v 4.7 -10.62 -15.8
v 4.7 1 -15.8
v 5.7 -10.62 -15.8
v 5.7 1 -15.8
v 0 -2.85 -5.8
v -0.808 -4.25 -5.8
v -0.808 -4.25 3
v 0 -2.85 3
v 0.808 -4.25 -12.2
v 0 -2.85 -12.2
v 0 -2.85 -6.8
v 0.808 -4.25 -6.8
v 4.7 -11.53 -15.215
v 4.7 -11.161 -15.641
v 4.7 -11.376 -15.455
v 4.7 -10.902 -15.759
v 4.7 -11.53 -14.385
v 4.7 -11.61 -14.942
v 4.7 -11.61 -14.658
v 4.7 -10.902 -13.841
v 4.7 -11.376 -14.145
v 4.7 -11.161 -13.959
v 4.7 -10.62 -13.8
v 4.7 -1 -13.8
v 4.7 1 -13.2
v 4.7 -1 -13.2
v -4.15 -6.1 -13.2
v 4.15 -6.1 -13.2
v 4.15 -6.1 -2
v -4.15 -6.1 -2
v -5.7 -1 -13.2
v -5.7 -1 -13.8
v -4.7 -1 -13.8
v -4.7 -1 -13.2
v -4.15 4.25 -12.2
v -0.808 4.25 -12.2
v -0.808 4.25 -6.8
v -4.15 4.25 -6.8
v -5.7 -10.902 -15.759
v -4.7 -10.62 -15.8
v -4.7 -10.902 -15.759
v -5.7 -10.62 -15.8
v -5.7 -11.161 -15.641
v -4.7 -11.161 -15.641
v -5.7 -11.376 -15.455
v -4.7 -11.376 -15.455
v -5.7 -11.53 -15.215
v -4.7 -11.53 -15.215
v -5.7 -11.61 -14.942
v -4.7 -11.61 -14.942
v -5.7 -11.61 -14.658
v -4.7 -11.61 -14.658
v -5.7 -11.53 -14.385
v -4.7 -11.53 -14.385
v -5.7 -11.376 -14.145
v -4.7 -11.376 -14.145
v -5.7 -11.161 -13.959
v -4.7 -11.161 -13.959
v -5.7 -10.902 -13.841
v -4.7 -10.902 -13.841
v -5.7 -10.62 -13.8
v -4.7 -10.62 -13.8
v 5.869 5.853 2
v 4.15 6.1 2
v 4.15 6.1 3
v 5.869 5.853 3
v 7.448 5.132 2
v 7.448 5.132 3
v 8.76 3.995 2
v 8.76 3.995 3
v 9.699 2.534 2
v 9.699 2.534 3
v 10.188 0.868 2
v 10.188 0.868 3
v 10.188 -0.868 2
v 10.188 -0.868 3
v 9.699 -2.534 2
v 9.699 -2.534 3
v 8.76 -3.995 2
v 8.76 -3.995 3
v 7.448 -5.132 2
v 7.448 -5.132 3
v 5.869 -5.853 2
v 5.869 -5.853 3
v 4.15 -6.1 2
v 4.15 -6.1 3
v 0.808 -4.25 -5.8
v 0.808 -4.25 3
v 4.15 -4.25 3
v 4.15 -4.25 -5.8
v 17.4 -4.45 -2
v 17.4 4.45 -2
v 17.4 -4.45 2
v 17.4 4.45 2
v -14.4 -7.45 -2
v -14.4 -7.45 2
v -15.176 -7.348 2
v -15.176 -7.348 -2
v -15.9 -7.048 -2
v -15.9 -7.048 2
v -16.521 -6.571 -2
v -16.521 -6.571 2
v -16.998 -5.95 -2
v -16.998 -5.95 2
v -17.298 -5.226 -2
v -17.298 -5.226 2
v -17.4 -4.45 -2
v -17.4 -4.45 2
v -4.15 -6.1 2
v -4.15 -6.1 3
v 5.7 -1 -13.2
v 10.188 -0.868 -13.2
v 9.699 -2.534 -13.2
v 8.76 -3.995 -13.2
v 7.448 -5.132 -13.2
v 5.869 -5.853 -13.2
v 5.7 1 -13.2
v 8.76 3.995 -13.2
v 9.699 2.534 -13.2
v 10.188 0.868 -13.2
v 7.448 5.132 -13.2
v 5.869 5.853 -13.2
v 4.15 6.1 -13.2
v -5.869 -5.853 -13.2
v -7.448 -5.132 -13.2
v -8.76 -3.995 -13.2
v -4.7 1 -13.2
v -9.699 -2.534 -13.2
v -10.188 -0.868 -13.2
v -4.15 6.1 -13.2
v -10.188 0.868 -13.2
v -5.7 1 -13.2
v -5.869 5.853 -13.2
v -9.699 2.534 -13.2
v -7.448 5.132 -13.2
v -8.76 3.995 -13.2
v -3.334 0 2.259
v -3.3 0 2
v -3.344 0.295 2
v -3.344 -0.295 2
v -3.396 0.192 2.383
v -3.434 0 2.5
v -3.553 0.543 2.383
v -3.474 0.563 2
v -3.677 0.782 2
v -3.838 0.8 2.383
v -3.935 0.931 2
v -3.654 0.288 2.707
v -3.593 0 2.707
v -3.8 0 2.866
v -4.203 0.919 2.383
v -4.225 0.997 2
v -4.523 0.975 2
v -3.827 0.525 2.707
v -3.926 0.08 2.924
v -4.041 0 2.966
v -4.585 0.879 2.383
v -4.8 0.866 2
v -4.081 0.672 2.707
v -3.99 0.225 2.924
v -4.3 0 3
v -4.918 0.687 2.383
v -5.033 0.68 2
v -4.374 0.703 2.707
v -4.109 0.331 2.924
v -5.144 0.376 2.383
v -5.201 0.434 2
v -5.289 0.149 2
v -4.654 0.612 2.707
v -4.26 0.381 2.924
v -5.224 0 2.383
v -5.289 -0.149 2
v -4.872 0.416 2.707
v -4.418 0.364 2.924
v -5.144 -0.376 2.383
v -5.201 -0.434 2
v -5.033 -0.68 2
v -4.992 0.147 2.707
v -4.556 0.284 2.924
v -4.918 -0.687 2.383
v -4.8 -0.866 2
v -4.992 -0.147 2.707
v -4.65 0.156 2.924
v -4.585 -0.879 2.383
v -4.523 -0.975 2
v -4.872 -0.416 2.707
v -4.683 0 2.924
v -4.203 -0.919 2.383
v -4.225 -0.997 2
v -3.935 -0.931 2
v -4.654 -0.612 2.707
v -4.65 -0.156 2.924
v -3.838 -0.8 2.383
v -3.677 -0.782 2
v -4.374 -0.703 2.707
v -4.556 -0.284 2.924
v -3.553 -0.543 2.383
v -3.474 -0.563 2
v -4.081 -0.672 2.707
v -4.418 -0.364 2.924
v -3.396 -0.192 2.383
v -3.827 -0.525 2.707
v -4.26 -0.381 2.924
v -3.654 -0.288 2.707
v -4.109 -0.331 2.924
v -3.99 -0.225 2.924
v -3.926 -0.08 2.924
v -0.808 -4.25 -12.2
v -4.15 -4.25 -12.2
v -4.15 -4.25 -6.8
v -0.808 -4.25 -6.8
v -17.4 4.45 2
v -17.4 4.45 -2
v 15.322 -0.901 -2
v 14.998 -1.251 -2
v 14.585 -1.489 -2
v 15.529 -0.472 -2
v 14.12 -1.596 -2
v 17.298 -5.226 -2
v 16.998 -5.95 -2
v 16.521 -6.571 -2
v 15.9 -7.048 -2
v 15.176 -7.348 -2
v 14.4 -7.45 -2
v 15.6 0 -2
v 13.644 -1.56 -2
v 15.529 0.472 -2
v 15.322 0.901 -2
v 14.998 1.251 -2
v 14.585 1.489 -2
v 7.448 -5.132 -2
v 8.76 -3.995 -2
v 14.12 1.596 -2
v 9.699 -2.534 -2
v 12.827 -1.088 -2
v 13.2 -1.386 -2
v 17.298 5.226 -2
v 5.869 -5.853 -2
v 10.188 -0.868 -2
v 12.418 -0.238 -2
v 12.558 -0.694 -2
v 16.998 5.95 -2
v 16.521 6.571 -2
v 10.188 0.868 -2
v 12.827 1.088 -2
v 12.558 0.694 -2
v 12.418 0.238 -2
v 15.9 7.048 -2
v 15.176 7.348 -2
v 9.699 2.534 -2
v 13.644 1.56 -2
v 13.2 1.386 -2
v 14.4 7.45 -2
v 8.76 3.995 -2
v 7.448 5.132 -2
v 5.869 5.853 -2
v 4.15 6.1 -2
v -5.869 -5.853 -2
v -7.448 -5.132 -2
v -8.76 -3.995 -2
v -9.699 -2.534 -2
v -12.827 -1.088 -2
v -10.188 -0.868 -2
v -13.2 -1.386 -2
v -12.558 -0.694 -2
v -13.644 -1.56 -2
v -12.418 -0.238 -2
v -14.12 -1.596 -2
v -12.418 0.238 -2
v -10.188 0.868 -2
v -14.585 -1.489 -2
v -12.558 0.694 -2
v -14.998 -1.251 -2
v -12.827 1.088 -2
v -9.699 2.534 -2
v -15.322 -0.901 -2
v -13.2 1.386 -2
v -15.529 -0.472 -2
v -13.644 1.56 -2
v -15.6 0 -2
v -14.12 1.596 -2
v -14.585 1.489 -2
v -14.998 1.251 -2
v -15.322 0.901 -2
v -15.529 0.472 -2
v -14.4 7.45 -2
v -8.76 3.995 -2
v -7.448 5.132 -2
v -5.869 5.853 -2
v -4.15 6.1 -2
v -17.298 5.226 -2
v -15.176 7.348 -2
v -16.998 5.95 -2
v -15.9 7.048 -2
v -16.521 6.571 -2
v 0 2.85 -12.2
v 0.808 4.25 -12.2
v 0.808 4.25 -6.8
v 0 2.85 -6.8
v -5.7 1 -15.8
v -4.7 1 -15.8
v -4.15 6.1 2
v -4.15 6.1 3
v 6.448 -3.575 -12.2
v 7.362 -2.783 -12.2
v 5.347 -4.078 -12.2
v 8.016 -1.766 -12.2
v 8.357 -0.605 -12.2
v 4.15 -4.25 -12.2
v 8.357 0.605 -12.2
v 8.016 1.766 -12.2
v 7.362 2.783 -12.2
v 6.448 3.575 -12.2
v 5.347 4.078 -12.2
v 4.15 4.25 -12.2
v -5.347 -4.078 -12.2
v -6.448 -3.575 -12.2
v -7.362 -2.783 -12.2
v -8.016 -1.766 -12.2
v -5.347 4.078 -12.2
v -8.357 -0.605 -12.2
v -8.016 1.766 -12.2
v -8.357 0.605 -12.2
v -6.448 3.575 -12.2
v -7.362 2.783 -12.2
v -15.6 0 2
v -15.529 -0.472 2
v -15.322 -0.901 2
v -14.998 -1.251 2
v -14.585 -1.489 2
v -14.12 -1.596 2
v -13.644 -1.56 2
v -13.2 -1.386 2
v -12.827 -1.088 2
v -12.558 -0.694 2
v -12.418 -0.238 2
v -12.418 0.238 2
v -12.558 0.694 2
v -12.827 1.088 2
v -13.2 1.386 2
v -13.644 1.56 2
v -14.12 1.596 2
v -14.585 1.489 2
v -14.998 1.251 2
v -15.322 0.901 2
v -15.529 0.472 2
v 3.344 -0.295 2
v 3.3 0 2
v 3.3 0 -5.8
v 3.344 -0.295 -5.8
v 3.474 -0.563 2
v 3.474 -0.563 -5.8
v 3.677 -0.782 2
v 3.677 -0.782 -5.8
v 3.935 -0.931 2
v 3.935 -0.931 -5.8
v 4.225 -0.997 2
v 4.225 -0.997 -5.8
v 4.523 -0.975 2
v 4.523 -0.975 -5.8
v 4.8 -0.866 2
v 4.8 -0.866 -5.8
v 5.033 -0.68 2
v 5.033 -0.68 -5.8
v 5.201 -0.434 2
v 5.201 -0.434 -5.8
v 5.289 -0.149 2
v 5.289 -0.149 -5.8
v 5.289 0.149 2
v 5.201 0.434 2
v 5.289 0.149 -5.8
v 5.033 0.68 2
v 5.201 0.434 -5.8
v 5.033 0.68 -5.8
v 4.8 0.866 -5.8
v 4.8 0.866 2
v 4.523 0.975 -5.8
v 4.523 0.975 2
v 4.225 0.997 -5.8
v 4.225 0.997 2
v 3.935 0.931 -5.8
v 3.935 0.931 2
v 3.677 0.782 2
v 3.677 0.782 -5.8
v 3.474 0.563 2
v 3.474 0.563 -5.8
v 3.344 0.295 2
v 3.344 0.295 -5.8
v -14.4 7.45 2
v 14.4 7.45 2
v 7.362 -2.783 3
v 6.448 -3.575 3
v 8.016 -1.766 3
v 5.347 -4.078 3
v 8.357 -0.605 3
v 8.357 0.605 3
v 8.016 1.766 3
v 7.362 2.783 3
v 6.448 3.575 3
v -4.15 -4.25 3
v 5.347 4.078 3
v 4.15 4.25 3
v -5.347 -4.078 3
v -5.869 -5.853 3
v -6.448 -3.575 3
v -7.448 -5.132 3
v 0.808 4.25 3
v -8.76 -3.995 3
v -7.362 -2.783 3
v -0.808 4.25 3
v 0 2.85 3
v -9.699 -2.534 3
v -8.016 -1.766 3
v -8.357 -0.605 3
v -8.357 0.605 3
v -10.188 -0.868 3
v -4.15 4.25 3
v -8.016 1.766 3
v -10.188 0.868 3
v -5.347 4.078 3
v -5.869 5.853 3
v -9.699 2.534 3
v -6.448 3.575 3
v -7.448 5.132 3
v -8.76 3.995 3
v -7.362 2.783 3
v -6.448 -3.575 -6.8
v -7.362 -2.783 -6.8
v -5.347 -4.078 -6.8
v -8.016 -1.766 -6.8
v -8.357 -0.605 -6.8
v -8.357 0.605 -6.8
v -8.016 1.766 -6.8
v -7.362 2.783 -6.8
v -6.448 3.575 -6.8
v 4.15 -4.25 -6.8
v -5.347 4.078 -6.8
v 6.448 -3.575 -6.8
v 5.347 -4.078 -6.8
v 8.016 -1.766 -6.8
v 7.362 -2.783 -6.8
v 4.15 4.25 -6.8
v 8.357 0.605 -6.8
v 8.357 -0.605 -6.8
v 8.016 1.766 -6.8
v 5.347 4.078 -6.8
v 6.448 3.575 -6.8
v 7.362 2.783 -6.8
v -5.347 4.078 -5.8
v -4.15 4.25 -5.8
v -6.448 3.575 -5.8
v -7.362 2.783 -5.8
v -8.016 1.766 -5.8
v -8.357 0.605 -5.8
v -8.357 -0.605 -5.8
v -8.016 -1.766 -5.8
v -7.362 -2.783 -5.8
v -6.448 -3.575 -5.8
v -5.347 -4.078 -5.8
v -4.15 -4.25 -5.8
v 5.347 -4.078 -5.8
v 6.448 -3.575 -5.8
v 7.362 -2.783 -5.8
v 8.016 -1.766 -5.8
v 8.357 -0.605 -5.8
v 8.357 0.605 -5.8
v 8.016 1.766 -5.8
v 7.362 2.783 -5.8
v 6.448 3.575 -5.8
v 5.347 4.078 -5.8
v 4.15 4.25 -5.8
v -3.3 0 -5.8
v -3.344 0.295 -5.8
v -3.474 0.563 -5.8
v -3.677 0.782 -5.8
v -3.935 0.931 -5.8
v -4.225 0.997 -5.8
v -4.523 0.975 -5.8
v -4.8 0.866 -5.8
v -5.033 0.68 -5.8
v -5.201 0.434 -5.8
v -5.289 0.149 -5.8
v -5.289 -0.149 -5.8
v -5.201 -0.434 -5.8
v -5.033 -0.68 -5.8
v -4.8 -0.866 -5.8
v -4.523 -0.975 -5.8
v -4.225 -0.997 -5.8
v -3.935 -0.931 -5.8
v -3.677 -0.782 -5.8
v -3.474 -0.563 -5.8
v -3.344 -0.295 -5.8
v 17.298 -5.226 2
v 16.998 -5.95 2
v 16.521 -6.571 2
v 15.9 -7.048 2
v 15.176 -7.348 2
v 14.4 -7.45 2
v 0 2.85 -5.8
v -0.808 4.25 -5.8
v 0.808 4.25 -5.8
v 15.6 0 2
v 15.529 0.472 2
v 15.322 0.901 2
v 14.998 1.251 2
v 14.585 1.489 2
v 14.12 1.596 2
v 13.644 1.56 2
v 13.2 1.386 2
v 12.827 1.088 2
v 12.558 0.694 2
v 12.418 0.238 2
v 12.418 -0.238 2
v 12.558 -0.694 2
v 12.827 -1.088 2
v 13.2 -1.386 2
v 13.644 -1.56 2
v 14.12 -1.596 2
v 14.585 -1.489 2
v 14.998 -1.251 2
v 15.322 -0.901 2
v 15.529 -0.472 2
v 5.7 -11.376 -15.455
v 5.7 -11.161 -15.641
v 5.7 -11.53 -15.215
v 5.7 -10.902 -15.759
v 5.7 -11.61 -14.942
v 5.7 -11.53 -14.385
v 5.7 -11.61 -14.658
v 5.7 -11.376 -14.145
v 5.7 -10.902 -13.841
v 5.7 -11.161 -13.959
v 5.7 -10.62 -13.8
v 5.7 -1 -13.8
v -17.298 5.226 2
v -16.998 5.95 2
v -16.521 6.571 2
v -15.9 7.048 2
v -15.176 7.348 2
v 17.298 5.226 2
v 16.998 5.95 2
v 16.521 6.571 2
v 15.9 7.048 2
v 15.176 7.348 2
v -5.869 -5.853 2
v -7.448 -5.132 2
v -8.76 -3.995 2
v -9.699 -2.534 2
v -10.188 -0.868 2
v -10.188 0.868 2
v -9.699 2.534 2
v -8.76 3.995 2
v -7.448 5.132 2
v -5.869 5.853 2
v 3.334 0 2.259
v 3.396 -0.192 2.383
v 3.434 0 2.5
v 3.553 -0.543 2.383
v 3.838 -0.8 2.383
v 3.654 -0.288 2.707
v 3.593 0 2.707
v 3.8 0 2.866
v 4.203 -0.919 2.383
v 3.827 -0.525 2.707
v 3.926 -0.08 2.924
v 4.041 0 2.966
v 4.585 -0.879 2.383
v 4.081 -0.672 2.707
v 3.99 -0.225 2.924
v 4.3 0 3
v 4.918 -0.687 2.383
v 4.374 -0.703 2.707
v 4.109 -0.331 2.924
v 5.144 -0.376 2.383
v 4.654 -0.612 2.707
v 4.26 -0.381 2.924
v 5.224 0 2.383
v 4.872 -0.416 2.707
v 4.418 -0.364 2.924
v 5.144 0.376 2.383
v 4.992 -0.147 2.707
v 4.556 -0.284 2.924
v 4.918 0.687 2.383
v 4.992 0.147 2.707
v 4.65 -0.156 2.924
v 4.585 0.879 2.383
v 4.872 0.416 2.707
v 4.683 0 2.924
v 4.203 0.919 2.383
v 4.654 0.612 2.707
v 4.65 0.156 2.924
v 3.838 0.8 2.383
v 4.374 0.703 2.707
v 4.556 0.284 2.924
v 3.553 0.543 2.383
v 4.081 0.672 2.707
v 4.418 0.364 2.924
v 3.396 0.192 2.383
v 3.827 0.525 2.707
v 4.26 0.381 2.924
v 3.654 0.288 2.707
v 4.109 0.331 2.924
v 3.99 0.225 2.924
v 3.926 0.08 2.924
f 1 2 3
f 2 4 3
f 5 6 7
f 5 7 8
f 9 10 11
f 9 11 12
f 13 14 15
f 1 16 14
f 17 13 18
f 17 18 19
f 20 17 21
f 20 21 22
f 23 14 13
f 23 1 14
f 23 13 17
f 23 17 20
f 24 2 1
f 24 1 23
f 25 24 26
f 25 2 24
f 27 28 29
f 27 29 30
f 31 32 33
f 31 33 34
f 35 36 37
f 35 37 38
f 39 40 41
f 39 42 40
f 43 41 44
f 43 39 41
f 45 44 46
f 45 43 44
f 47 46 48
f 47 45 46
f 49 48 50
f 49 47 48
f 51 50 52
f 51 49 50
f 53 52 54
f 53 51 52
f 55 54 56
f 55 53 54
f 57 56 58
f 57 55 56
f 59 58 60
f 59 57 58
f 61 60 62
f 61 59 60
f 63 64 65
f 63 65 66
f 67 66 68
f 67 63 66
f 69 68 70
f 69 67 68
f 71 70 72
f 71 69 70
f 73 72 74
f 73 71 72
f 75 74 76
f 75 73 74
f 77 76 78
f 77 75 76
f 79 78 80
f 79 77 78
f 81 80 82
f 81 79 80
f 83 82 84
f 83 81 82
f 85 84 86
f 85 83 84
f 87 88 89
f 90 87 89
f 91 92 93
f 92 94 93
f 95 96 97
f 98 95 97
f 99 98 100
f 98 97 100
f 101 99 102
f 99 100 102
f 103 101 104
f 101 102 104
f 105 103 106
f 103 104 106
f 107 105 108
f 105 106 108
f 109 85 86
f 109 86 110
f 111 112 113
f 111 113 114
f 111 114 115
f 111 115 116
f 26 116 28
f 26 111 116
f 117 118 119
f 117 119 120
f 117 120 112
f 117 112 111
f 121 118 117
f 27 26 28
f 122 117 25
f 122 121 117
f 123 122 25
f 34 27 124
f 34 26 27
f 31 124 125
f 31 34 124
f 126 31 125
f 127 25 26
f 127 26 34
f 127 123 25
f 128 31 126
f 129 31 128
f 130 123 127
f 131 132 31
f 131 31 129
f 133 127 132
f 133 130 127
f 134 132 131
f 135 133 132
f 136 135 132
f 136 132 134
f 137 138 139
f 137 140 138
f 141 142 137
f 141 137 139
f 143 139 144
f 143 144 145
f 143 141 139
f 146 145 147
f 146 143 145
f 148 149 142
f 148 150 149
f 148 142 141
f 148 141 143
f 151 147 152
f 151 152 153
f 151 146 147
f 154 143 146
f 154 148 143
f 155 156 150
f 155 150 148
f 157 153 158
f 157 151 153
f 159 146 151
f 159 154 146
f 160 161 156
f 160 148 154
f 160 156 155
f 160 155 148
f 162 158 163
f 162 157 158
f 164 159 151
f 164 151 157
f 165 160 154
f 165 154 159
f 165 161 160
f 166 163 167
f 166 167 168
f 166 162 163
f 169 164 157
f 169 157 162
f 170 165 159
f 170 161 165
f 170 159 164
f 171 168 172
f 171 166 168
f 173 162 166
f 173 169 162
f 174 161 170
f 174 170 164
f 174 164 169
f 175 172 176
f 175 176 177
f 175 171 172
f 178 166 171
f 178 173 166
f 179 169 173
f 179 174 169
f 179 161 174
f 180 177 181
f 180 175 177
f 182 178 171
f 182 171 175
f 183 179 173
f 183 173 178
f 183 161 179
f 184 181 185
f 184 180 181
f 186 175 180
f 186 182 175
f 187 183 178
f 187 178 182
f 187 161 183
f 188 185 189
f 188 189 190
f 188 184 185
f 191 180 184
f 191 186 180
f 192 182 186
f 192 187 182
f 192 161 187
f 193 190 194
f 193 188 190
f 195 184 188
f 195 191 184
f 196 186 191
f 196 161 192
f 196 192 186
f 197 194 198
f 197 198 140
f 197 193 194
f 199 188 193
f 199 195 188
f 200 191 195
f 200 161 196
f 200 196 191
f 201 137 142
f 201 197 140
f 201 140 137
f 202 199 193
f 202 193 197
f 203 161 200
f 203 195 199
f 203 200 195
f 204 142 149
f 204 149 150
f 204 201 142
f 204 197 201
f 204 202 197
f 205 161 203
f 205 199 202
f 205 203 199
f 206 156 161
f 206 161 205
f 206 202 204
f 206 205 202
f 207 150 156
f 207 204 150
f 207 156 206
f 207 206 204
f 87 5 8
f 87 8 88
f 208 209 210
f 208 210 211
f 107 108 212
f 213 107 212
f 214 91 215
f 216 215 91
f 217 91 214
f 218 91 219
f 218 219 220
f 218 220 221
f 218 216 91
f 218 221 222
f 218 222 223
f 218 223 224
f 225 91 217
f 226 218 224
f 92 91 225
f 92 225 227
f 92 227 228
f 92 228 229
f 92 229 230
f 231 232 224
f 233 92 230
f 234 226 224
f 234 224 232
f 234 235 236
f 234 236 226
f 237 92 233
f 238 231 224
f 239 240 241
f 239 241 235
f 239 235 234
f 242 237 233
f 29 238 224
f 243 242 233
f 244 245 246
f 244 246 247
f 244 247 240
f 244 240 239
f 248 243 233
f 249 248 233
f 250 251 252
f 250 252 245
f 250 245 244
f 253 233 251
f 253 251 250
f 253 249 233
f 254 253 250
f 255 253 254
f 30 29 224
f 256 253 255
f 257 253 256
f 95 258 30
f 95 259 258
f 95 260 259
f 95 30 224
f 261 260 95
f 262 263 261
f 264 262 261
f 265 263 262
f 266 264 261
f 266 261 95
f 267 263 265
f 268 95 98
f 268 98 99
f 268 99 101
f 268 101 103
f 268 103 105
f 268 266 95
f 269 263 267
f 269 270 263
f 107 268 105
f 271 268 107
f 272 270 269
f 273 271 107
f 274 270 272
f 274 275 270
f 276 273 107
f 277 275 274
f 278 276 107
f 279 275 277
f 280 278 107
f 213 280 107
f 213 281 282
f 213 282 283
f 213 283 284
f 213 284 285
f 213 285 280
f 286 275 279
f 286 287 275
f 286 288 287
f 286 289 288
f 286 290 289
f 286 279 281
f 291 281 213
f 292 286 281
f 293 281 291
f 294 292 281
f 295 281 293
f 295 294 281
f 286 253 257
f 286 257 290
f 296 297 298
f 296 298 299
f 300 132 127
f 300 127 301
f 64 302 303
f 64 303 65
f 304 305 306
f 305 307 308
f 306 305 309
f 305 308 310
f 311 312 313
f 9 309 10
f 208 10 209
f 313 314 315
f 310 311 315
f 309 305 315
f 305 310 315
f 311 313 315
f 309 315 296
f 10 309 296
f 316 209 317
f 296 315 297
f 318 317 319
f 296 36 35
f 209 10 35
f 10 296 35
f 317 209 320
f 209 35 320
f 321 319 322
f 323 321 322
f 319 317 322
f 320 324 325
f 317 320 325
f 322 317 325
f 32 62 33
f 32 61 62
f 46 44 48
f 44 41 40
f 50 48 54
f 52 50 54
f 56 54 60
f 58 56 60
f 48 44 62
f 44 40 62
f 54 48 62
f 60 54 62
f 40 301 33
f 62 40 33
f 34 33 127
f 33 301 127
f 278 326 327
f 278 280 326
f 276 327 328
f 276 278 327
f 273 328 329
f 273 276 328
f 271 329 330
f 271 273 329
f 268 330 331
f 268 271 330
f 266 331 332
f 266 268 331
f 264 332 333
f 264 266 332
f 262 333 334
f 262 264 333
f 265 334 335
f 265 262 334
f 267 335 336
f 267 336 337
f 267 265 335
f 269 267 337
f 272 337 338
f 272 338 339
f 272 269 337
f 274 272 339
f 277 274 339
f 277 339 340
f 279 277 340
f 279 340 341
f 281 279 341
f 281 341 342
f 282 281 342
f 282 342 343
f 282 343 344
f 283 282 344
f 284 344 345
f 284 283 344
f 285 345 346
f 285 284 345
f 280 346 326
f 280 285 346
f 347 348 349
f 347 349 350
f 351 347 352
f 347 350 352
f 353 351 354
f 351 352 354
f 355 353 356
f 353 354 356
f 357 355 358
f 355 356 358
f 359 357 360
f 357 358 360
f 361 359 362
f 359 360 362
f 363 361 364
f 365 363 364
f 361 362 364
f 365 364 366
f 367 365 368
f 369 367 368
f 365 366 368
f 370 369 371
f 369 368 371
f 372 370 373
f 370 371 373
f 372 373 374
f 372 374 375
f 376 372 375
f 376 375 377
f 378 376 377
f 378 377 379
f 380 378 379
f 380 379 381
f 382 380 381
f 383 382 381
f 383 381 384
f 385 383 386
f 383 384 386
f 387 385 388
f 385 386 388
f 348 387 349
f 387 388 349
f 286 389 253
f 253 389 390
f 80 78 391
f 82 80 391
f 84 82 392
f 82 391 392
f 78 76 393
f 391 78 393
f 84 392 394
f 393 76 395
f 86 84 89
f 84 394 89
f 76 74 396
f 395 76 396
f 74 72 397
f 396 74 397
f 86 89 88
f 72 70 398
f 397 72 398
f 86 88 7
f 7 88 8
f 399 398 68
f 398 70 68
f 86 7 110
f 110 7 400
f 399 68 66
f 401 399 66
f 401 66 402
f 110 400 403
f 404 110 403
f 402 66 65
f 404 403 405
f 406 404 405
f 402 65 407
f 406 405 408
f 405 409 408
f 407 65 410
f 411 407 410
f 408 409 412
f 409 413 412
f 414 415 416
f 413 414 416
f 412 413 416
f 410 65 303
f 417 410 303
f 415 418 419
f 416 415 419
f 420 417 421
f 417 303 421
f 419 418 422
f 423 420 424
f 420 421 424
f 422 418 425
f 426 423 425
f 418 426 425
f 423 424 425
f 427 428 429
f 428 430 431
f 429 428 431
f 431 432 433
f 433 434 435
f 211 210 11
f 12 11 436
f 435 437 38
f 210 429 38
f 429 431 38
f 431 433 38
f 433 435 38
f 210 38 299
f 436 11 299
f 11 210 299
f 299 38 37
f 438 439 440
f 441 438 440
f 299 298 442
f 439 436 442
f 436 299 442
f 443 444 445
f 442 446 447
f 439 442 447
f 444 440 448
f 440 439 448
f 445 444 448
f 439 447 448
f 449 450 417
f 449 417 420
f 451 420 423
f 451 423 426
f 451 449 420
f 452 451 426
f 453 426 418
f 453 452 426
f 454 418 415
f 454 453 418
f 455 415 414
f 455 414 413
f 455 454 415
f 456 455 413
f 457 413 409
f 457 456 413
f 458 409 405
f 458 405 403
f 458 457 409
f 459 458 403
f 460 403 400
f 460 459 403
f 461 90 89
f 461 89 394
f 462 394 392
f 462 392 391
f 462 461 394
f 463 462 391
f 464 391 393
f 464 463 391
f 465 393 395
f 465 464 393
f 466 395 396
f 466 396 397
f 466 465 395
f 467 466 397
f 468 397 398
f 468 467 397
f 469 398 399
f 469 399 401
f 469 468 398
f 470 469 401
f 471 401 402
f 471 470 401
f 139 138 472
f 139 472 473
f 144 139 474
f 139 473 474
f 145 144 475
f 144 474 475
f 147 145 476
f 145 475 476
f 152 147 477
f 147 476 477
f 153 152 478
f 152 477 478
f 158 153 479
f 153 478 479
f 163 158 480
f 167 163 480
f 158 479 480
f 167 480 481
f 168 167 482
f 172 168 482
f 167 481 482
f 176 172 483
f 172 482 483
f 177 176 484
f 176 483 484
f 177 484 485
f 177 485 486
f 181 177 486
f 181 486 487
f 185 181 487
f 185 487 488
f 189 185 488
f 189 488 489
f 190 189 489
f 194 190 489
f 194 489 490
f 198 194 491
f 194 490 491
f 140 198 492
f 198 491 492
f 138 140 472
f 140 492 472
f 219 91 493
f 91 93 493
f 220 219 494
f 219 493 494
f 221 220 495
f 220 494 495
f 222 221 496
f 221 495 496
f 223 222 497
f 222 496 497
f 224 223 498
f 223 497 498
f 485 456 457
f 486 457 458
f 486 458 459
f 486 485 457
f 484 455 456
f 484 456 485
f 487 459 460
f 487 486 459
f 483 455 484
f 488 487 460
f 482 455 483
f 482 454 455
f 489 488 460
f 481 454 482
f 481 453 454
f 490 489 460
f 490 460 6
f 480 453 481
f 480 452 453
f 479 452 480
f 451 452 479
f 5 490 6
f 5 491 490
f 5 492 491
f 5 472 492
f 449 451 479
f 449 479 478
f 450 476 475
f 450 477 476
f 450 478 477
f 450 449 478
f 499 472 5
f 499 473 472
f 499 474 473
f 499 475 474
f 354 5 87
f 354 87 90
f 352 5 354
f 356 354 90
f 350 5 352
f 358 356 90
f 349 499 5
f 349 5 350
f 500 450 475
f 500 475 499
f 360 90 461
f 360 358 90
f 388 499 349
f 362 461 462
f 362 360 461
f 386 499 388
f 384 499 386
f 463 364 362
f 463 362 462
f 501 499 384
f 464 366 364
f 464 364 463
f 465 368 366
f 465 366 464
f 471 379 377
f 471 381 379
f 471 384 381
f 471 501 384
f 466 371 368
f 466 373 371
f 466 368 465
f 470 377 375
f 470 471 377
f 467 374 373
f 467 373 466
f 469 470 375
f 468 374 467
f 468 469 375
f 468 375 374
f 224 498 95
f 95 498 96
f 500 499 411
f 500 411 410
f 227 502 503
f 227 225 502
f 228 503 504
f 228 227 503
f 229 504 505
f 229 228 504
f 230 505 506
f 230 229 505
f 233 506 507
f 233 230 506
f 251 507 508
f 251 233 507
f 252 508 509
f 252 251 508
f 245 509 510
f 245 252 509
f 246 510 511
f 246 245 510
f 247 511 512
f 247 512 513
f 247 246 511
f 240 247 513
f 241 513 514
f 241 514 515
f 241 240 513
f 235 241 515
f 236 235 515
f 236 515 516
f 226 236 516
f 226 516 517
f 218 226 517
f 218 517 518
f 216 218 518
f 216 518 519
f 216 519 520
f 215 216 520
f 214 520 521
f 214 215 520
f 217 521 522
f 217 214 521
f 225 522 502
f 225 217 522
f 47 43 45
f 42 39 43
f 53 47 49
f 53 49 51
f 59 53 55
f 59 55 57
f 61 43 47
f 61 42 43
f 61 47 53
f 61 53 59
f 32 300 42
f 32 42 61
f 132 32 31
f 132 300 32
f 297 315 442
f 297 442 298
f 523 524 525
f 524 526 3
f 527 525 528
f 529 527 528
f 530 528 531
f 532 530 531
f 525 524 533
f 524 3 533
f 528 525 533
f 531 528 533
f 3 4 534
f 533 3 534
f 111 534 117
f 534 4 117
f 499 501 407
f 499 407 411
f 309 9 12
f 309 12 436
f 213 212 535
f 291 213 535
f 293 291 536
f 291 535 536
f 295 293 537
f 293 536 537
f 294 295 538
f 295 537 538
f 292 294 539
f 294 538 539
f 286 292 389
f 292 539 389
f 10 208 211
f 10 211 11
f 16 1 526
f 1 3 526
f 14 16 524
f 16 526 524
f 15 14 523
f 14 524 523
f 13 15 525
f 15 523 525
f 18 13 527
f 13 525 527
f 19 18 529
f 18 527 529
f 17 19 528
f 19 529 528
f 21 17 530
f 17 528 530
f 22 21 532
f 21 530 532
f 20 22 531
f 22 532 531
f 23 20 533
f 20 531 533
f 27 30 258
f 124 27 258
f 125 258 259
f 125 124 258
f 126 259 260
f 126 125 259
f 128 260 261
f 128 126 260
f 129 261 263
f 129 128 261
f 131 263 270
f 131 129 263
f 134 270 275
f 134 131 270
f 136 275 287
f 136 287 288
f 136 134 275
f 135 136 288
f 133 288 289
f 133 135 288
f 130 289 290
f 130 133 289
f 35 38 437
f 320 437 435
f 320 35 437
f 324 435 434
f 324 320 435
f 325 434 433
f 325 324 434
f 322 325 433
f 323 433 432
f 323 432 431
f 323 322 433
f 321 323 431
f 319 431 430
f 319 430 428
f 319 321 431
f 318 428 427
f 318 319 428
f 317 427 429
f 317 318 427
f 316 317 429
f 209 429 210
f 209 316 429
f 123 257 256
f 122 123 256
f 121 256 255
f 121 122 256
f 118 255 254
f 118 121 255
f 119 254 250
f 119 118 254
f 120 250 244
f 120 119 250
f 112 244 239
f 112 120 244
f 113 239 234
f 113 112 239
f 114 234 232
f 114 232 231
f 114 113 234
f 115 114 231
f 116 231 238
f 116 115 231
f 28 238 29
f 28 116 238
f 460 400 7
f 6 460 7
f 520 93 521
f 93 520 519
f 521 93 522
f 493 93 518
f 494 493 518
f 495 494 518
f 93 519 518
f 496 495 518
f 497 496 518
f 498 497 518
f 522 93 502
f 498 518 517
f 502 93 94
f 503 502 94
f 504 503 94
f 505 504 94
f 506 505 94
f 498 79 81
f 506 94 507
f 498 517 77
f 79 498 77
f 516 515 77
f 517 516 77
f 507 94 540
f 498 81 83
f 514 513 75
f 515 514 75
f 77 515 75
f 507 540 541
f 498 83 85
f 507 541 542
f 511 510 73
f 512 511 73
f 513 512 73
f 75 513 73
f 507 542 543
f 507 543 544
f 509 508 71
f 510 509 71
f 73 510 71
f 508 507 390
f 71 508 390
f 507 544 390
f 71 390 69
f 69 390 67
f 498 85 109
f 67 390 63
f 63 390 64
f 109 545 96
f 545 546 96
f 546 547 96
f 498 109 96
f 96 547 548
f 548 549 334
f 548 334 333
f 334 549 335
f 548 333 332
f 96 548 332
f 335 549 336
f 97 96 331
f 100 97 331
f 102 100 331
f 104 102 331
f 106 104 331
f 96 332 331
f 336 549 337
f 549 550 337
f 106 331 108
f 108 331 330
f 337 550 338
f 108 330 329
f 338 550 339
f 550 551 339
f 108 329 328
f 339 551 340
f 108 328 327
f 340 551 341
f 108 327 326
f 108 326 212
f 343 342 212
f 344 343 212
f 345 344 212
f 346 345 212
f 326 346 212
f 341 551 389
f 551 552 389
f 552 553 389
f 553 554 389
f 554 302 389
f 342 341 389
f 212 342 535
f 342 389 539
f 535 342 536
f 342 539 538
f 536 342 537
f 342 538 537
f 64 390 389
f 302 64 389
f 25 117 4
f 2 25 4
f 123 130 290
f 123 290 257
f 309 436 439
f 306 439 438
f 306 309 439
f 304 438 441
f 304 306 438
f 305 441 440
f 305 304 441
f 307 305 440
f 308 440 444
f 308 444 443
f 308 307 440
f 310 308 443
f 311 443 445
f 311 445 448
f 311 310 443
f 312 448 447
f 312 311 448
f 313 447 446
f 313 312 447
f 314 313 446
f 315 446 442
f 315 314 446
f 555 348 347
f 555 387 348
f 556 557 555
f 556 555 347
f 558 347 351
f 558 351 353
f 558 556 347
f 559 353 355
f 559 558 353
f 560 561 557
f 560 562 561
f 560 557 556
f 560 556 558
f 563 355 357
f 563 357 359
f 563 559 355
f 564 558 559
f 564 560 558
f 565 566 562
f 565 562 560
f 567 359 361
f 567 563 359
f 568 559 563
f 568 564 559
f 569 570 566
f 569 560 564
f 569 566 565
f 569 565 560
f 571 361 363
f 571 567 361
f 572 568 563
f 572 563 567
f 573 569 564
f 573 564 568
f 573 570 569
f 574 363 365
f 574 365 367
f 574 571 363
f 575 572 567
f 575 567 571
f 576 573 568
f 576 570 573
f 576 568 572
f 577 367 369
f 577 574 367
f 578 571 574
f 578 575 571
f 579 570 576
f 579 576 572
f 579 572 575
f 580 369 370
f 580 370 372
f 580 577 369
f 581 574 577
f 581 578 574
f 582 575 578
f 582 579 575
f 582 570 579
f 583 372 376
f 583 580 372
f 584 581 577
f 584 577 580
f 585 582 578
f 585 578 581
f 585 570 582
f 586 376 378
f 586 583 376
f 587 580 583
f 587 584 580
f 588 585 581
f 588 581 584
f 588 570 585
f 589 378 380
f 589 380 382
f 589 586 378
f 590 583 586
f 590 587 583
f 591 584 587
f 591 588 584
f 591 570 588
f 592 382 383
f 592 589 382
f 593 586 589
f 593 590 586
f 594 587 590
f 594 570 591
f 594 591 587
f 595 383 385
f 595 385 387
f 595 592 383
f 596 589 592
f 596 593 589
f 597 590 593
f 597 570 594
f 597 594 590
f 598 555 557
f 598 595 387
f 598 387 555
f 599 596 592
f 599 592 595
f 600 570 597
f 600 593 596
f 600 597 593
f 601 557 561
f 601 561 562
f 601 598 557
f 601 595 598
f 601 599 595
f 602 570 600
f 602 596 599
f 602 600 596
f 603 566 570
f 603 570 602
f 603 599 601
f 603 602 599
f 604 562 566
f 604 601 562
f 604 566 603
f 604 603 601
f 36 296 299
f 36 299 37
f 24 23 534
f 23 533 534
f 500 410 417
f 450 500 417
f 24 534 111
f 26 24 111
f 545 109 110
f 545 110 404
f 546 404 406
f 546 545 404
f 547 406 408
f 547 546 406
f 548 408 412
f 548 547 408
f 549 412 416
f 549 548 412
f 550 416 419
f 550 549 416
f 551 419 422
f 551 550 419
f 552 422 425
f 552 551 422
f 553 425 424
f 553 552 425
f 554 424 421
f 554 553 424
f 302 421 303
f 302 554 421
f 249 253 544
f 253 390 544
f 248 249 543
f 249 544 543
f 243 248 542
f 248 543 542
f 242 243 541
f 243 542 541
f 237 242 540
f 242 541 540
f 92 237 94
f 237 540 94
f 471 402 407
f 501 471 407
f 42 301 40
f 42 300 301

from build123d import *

# Parameters (mm, degrees)
SKETCH1_R                = 1.6
BOSS_EXTRUDE1_DEPTH      = 2
BOSS_EXTRUDE2_DEPTH      = 1
BOSS_EXTRUDE2_DEPTH_BACK = 15.2
BOSS_EXTRUDE3_START      = -9.8
BOSS_EXTRUDE3_DEPTH      = 1
BOSS_EXTRUDE4_START      = 5.2
BOSS_EXTRUDE4_DEPTH      = 0.5
BOSS_EXTRUDE6_DEPTH      = 1
SKETCH6_R                = 1
BOSS_EXTRUDE7_DEPTH      = 8.8
FILLET1_R                = 1


with BuildPart() as part:
    # Sketch1 → Boss-Extrude1 (new, symmetric)
    with BuildSketch(Plane.XY):
        with BuildLine():
            Line((-14.4, 7.45), (14.4, 7.45))
            ThreePointArc((14.4, 7.45), (16.521320344, 6.571320344), (17.4, 4.45))
            Line((17.4, 4.45), (17.4, -4.45))
            ThreePointArc((17.4, -4.45), (16.521320344, -6.571320344), (14.4, -7.45))
            Line((14.4, -7.45), (-14.4, -7.45))
            ThreePointArc((-14.4, -7.45), (-16.521320344, -6.571320344), (-17.4, -4.45))
            Line((-17.4, -4.45), (-17.4, 4.45))
            ThreePointArc((-17.4, 4.45), (-16.521320344, 6.571320344), (-14.4, 7.45))
        make_face()
        with Locations((14, 0)):
            Circle(SKETCH1_R, mode=Mode.SUBTRACT)
        with Locations(Location((-14, 0, 0), (0, 0, 180))):
            Circle(SKETCH1_R, mode=Mode.SUBTRACT)
        with BuildLine():
            Line((-4.15, 4.25), (-0.808290377, 4.25))
            Line((-0.808290377, 4.25), (0, 2.85))
            Line((0, 2.85), (0.808290377, 4.25))
            Line((0.808290377, 4.25), (4.15, 4.25))
            ThreePointArc((4.15, 4.25), (8.4, 0), (4.15, -4.25))
            Line((4.15, -4.25), (0.808290377, -4.25))
            Line((0.808290377, -4.25), (0, -2.85))
            Line((0, -2.85), (-0.808290377, -4.25))
            Line((-0.808290377, -4.25), (-4.15, -4.25))
            ThreePointArc((-4.15, -4.25), (-8.4, 0), (-4.15, 4.25))
        make_face(mode=Mode.SUBTRACT)
    extrude(amount=BOSS_EXTRUDE1_DEPTH, both=True)

    # Sketch2 → Boss-Extrude2 (add, two sides: drawn at the far end of the back side and taken through both)
    with BuildSketch(Plane.XY.offset(2).offset(-BOSS_EXTRUDE2_DEPTH_BACK)):
        with BuildLine():
            Line((-4.15, 6.1), (4.15, 6.1))
            ThreePointArc((4.15, 6.1), (10.25, 0), (4.15, -6.1))
            Line((4.15, -6.1), (-4.15, -6.1))
            ThreePointArc((-4.15, -6.1), (-10.25, 0), (-4.15, 6.1))
        make_face()
        with BuildLine():
            Line((0.808290377, 4.25), (0, 2.85))
            Line((0, 2.85), (-0.808290377, 4.25))
            Line((-0.808290377, 4.25), (-4.15, 4.25))
            ThreePointArc((-4.15, 4.25), (-8.4, 0), (-4.15, -4.25))
            Line((-4.15, -4.25), (-0.808290377, -4.25))
            Line((-0.808290377, -4.25), (0, -2.85))
            Line((0, -2.85), (0.808290377, -4.25))
            Line((0.808290377, -4.25), (4.15, -4.25))
            ThreePointArc((4.15, -4.25), (8.4, 0), (4.15, 4.25))
            Line((4.15, 4.25), (0.808290377, 4.25))
        make_face(mode=Mode.SUBTRACT)
    extrude(amount=BOSS_EXTRUDE2_DEPTH + BOSS_EXTRUDE2_DEPTH_BACK)

    # Sketch3 → Boss-Extrude3 (add)
    with BuildSketch(Plane.XY.offset(3).offset(BOSS_EXTRUDE3_START)):
        with BuildLine():
            Line((0.808290377, 4.25), (0, 2.85))
            Line((0, 2.85), (-0.808290377, 4.25))
            Line((-0.808290377, 4.25), (-4.15, 4.25))
            ThreePointArc((-4.15, 4.25), (-8.4, 0), (-4.15, -4.25))
            Line((-4.15, -4.25), (-0.808290377, -4.25))
            Line((-0.808290377, -4.25), (0, -2.85))
            Line((0, -2.85), (0.808290377, -4.25))
            Line((0.808290377, -4.25), (4.15, -4.25))
            ThreePointArc((4.15, -4.25), (8.4, 0), (4.15, 4.25))
            Line((4.15, 4.25), (0.808290377, 4.25))
        make_face()
    extrude(amount=BOSS_EXTRUDE3_DEPTH)



with BuildPart() as body_2:
    # Sketch4 → Boss-Extrude4 (new, symmetric)
    with BuildSketch(Plane(origin=(0, 0, 0), x_dir=(0, 0, -1), z_dir=(1, 0, 0)).offset(BOSS_EXTRUDE4_START)):
        with BuildLine():
            Line((13.2, 1), (15.8, 1))
            Line((15.8, 1), (15.8, -10.62))
            ThreePointArc((15.8, -10.62), (14.8, -11.62), (13.8, -10.62))
            Line((13.8, -10.62), (13.8, -1))
            Line((13.8, -1), (13.2, -1))
            Line((13.2, -1), (13.2, 1))
        make_face()
    boss_extrude4 = extrude(amount=BOSS_EXTRUDE4_DEPTH, both=True)


with BuildPart() as part_1:
    add(part.part)

    add(body_2.part)  # Boss-Extrude6 merges body 2
    # Sketch5 → Boss-Extrude6 (add)
    with BuildSketch(Plane(origin=(0, 0, -13.2), x_dir=(-1, 0, 0), z_dir=(0, 0, -1))):
        with BuildLine():
            Line((4.15, 6.1), (-4.15, 6.1))
            ThreePointArc((-4.15, 6.1), (-10.25, 0), (-4.15, -6.1))
            Line((-4.15, -6.1), (4.15, -6.1))
            ThreePointArc((4.15, -6.1), (10.25, 0), (4.15, 6.1))
        make_face()
    extrude(amount=-BOSS_EXTRUDE6_DEPTH)

    # Mirror2: Boss-Extrude4 across plane
    add(boss_extrude4.mirror(Plane(origin=(0, 0, 0), x_dir=(0, 0, 1), z_dir=(1, 0, 0))))

    # Sketch6 → Boss-Extrude7 (add)
    with BuildSketch(Plane.XY.offset(-5.8)):
        with Locations((-4.3, 0)):
            Circle(SKETCH6_R)
        with Locations(Location((4.3, 0, 0), (0, 0, 180))):
            Circle(SKETCH6_R)
    extrude(amount=BOSS_EXTRUDE7_DEPTH)

    # Fillet1
    fillet1_edges = [part_1.edges().sort_by_distance(p)[0] for p in [
        (-5.3, 0, 3),
        (5.3, 0, 3),
    ]]
    fillet(fillet1_edges, radius=FILLET1_R)


solid = part_1.part
